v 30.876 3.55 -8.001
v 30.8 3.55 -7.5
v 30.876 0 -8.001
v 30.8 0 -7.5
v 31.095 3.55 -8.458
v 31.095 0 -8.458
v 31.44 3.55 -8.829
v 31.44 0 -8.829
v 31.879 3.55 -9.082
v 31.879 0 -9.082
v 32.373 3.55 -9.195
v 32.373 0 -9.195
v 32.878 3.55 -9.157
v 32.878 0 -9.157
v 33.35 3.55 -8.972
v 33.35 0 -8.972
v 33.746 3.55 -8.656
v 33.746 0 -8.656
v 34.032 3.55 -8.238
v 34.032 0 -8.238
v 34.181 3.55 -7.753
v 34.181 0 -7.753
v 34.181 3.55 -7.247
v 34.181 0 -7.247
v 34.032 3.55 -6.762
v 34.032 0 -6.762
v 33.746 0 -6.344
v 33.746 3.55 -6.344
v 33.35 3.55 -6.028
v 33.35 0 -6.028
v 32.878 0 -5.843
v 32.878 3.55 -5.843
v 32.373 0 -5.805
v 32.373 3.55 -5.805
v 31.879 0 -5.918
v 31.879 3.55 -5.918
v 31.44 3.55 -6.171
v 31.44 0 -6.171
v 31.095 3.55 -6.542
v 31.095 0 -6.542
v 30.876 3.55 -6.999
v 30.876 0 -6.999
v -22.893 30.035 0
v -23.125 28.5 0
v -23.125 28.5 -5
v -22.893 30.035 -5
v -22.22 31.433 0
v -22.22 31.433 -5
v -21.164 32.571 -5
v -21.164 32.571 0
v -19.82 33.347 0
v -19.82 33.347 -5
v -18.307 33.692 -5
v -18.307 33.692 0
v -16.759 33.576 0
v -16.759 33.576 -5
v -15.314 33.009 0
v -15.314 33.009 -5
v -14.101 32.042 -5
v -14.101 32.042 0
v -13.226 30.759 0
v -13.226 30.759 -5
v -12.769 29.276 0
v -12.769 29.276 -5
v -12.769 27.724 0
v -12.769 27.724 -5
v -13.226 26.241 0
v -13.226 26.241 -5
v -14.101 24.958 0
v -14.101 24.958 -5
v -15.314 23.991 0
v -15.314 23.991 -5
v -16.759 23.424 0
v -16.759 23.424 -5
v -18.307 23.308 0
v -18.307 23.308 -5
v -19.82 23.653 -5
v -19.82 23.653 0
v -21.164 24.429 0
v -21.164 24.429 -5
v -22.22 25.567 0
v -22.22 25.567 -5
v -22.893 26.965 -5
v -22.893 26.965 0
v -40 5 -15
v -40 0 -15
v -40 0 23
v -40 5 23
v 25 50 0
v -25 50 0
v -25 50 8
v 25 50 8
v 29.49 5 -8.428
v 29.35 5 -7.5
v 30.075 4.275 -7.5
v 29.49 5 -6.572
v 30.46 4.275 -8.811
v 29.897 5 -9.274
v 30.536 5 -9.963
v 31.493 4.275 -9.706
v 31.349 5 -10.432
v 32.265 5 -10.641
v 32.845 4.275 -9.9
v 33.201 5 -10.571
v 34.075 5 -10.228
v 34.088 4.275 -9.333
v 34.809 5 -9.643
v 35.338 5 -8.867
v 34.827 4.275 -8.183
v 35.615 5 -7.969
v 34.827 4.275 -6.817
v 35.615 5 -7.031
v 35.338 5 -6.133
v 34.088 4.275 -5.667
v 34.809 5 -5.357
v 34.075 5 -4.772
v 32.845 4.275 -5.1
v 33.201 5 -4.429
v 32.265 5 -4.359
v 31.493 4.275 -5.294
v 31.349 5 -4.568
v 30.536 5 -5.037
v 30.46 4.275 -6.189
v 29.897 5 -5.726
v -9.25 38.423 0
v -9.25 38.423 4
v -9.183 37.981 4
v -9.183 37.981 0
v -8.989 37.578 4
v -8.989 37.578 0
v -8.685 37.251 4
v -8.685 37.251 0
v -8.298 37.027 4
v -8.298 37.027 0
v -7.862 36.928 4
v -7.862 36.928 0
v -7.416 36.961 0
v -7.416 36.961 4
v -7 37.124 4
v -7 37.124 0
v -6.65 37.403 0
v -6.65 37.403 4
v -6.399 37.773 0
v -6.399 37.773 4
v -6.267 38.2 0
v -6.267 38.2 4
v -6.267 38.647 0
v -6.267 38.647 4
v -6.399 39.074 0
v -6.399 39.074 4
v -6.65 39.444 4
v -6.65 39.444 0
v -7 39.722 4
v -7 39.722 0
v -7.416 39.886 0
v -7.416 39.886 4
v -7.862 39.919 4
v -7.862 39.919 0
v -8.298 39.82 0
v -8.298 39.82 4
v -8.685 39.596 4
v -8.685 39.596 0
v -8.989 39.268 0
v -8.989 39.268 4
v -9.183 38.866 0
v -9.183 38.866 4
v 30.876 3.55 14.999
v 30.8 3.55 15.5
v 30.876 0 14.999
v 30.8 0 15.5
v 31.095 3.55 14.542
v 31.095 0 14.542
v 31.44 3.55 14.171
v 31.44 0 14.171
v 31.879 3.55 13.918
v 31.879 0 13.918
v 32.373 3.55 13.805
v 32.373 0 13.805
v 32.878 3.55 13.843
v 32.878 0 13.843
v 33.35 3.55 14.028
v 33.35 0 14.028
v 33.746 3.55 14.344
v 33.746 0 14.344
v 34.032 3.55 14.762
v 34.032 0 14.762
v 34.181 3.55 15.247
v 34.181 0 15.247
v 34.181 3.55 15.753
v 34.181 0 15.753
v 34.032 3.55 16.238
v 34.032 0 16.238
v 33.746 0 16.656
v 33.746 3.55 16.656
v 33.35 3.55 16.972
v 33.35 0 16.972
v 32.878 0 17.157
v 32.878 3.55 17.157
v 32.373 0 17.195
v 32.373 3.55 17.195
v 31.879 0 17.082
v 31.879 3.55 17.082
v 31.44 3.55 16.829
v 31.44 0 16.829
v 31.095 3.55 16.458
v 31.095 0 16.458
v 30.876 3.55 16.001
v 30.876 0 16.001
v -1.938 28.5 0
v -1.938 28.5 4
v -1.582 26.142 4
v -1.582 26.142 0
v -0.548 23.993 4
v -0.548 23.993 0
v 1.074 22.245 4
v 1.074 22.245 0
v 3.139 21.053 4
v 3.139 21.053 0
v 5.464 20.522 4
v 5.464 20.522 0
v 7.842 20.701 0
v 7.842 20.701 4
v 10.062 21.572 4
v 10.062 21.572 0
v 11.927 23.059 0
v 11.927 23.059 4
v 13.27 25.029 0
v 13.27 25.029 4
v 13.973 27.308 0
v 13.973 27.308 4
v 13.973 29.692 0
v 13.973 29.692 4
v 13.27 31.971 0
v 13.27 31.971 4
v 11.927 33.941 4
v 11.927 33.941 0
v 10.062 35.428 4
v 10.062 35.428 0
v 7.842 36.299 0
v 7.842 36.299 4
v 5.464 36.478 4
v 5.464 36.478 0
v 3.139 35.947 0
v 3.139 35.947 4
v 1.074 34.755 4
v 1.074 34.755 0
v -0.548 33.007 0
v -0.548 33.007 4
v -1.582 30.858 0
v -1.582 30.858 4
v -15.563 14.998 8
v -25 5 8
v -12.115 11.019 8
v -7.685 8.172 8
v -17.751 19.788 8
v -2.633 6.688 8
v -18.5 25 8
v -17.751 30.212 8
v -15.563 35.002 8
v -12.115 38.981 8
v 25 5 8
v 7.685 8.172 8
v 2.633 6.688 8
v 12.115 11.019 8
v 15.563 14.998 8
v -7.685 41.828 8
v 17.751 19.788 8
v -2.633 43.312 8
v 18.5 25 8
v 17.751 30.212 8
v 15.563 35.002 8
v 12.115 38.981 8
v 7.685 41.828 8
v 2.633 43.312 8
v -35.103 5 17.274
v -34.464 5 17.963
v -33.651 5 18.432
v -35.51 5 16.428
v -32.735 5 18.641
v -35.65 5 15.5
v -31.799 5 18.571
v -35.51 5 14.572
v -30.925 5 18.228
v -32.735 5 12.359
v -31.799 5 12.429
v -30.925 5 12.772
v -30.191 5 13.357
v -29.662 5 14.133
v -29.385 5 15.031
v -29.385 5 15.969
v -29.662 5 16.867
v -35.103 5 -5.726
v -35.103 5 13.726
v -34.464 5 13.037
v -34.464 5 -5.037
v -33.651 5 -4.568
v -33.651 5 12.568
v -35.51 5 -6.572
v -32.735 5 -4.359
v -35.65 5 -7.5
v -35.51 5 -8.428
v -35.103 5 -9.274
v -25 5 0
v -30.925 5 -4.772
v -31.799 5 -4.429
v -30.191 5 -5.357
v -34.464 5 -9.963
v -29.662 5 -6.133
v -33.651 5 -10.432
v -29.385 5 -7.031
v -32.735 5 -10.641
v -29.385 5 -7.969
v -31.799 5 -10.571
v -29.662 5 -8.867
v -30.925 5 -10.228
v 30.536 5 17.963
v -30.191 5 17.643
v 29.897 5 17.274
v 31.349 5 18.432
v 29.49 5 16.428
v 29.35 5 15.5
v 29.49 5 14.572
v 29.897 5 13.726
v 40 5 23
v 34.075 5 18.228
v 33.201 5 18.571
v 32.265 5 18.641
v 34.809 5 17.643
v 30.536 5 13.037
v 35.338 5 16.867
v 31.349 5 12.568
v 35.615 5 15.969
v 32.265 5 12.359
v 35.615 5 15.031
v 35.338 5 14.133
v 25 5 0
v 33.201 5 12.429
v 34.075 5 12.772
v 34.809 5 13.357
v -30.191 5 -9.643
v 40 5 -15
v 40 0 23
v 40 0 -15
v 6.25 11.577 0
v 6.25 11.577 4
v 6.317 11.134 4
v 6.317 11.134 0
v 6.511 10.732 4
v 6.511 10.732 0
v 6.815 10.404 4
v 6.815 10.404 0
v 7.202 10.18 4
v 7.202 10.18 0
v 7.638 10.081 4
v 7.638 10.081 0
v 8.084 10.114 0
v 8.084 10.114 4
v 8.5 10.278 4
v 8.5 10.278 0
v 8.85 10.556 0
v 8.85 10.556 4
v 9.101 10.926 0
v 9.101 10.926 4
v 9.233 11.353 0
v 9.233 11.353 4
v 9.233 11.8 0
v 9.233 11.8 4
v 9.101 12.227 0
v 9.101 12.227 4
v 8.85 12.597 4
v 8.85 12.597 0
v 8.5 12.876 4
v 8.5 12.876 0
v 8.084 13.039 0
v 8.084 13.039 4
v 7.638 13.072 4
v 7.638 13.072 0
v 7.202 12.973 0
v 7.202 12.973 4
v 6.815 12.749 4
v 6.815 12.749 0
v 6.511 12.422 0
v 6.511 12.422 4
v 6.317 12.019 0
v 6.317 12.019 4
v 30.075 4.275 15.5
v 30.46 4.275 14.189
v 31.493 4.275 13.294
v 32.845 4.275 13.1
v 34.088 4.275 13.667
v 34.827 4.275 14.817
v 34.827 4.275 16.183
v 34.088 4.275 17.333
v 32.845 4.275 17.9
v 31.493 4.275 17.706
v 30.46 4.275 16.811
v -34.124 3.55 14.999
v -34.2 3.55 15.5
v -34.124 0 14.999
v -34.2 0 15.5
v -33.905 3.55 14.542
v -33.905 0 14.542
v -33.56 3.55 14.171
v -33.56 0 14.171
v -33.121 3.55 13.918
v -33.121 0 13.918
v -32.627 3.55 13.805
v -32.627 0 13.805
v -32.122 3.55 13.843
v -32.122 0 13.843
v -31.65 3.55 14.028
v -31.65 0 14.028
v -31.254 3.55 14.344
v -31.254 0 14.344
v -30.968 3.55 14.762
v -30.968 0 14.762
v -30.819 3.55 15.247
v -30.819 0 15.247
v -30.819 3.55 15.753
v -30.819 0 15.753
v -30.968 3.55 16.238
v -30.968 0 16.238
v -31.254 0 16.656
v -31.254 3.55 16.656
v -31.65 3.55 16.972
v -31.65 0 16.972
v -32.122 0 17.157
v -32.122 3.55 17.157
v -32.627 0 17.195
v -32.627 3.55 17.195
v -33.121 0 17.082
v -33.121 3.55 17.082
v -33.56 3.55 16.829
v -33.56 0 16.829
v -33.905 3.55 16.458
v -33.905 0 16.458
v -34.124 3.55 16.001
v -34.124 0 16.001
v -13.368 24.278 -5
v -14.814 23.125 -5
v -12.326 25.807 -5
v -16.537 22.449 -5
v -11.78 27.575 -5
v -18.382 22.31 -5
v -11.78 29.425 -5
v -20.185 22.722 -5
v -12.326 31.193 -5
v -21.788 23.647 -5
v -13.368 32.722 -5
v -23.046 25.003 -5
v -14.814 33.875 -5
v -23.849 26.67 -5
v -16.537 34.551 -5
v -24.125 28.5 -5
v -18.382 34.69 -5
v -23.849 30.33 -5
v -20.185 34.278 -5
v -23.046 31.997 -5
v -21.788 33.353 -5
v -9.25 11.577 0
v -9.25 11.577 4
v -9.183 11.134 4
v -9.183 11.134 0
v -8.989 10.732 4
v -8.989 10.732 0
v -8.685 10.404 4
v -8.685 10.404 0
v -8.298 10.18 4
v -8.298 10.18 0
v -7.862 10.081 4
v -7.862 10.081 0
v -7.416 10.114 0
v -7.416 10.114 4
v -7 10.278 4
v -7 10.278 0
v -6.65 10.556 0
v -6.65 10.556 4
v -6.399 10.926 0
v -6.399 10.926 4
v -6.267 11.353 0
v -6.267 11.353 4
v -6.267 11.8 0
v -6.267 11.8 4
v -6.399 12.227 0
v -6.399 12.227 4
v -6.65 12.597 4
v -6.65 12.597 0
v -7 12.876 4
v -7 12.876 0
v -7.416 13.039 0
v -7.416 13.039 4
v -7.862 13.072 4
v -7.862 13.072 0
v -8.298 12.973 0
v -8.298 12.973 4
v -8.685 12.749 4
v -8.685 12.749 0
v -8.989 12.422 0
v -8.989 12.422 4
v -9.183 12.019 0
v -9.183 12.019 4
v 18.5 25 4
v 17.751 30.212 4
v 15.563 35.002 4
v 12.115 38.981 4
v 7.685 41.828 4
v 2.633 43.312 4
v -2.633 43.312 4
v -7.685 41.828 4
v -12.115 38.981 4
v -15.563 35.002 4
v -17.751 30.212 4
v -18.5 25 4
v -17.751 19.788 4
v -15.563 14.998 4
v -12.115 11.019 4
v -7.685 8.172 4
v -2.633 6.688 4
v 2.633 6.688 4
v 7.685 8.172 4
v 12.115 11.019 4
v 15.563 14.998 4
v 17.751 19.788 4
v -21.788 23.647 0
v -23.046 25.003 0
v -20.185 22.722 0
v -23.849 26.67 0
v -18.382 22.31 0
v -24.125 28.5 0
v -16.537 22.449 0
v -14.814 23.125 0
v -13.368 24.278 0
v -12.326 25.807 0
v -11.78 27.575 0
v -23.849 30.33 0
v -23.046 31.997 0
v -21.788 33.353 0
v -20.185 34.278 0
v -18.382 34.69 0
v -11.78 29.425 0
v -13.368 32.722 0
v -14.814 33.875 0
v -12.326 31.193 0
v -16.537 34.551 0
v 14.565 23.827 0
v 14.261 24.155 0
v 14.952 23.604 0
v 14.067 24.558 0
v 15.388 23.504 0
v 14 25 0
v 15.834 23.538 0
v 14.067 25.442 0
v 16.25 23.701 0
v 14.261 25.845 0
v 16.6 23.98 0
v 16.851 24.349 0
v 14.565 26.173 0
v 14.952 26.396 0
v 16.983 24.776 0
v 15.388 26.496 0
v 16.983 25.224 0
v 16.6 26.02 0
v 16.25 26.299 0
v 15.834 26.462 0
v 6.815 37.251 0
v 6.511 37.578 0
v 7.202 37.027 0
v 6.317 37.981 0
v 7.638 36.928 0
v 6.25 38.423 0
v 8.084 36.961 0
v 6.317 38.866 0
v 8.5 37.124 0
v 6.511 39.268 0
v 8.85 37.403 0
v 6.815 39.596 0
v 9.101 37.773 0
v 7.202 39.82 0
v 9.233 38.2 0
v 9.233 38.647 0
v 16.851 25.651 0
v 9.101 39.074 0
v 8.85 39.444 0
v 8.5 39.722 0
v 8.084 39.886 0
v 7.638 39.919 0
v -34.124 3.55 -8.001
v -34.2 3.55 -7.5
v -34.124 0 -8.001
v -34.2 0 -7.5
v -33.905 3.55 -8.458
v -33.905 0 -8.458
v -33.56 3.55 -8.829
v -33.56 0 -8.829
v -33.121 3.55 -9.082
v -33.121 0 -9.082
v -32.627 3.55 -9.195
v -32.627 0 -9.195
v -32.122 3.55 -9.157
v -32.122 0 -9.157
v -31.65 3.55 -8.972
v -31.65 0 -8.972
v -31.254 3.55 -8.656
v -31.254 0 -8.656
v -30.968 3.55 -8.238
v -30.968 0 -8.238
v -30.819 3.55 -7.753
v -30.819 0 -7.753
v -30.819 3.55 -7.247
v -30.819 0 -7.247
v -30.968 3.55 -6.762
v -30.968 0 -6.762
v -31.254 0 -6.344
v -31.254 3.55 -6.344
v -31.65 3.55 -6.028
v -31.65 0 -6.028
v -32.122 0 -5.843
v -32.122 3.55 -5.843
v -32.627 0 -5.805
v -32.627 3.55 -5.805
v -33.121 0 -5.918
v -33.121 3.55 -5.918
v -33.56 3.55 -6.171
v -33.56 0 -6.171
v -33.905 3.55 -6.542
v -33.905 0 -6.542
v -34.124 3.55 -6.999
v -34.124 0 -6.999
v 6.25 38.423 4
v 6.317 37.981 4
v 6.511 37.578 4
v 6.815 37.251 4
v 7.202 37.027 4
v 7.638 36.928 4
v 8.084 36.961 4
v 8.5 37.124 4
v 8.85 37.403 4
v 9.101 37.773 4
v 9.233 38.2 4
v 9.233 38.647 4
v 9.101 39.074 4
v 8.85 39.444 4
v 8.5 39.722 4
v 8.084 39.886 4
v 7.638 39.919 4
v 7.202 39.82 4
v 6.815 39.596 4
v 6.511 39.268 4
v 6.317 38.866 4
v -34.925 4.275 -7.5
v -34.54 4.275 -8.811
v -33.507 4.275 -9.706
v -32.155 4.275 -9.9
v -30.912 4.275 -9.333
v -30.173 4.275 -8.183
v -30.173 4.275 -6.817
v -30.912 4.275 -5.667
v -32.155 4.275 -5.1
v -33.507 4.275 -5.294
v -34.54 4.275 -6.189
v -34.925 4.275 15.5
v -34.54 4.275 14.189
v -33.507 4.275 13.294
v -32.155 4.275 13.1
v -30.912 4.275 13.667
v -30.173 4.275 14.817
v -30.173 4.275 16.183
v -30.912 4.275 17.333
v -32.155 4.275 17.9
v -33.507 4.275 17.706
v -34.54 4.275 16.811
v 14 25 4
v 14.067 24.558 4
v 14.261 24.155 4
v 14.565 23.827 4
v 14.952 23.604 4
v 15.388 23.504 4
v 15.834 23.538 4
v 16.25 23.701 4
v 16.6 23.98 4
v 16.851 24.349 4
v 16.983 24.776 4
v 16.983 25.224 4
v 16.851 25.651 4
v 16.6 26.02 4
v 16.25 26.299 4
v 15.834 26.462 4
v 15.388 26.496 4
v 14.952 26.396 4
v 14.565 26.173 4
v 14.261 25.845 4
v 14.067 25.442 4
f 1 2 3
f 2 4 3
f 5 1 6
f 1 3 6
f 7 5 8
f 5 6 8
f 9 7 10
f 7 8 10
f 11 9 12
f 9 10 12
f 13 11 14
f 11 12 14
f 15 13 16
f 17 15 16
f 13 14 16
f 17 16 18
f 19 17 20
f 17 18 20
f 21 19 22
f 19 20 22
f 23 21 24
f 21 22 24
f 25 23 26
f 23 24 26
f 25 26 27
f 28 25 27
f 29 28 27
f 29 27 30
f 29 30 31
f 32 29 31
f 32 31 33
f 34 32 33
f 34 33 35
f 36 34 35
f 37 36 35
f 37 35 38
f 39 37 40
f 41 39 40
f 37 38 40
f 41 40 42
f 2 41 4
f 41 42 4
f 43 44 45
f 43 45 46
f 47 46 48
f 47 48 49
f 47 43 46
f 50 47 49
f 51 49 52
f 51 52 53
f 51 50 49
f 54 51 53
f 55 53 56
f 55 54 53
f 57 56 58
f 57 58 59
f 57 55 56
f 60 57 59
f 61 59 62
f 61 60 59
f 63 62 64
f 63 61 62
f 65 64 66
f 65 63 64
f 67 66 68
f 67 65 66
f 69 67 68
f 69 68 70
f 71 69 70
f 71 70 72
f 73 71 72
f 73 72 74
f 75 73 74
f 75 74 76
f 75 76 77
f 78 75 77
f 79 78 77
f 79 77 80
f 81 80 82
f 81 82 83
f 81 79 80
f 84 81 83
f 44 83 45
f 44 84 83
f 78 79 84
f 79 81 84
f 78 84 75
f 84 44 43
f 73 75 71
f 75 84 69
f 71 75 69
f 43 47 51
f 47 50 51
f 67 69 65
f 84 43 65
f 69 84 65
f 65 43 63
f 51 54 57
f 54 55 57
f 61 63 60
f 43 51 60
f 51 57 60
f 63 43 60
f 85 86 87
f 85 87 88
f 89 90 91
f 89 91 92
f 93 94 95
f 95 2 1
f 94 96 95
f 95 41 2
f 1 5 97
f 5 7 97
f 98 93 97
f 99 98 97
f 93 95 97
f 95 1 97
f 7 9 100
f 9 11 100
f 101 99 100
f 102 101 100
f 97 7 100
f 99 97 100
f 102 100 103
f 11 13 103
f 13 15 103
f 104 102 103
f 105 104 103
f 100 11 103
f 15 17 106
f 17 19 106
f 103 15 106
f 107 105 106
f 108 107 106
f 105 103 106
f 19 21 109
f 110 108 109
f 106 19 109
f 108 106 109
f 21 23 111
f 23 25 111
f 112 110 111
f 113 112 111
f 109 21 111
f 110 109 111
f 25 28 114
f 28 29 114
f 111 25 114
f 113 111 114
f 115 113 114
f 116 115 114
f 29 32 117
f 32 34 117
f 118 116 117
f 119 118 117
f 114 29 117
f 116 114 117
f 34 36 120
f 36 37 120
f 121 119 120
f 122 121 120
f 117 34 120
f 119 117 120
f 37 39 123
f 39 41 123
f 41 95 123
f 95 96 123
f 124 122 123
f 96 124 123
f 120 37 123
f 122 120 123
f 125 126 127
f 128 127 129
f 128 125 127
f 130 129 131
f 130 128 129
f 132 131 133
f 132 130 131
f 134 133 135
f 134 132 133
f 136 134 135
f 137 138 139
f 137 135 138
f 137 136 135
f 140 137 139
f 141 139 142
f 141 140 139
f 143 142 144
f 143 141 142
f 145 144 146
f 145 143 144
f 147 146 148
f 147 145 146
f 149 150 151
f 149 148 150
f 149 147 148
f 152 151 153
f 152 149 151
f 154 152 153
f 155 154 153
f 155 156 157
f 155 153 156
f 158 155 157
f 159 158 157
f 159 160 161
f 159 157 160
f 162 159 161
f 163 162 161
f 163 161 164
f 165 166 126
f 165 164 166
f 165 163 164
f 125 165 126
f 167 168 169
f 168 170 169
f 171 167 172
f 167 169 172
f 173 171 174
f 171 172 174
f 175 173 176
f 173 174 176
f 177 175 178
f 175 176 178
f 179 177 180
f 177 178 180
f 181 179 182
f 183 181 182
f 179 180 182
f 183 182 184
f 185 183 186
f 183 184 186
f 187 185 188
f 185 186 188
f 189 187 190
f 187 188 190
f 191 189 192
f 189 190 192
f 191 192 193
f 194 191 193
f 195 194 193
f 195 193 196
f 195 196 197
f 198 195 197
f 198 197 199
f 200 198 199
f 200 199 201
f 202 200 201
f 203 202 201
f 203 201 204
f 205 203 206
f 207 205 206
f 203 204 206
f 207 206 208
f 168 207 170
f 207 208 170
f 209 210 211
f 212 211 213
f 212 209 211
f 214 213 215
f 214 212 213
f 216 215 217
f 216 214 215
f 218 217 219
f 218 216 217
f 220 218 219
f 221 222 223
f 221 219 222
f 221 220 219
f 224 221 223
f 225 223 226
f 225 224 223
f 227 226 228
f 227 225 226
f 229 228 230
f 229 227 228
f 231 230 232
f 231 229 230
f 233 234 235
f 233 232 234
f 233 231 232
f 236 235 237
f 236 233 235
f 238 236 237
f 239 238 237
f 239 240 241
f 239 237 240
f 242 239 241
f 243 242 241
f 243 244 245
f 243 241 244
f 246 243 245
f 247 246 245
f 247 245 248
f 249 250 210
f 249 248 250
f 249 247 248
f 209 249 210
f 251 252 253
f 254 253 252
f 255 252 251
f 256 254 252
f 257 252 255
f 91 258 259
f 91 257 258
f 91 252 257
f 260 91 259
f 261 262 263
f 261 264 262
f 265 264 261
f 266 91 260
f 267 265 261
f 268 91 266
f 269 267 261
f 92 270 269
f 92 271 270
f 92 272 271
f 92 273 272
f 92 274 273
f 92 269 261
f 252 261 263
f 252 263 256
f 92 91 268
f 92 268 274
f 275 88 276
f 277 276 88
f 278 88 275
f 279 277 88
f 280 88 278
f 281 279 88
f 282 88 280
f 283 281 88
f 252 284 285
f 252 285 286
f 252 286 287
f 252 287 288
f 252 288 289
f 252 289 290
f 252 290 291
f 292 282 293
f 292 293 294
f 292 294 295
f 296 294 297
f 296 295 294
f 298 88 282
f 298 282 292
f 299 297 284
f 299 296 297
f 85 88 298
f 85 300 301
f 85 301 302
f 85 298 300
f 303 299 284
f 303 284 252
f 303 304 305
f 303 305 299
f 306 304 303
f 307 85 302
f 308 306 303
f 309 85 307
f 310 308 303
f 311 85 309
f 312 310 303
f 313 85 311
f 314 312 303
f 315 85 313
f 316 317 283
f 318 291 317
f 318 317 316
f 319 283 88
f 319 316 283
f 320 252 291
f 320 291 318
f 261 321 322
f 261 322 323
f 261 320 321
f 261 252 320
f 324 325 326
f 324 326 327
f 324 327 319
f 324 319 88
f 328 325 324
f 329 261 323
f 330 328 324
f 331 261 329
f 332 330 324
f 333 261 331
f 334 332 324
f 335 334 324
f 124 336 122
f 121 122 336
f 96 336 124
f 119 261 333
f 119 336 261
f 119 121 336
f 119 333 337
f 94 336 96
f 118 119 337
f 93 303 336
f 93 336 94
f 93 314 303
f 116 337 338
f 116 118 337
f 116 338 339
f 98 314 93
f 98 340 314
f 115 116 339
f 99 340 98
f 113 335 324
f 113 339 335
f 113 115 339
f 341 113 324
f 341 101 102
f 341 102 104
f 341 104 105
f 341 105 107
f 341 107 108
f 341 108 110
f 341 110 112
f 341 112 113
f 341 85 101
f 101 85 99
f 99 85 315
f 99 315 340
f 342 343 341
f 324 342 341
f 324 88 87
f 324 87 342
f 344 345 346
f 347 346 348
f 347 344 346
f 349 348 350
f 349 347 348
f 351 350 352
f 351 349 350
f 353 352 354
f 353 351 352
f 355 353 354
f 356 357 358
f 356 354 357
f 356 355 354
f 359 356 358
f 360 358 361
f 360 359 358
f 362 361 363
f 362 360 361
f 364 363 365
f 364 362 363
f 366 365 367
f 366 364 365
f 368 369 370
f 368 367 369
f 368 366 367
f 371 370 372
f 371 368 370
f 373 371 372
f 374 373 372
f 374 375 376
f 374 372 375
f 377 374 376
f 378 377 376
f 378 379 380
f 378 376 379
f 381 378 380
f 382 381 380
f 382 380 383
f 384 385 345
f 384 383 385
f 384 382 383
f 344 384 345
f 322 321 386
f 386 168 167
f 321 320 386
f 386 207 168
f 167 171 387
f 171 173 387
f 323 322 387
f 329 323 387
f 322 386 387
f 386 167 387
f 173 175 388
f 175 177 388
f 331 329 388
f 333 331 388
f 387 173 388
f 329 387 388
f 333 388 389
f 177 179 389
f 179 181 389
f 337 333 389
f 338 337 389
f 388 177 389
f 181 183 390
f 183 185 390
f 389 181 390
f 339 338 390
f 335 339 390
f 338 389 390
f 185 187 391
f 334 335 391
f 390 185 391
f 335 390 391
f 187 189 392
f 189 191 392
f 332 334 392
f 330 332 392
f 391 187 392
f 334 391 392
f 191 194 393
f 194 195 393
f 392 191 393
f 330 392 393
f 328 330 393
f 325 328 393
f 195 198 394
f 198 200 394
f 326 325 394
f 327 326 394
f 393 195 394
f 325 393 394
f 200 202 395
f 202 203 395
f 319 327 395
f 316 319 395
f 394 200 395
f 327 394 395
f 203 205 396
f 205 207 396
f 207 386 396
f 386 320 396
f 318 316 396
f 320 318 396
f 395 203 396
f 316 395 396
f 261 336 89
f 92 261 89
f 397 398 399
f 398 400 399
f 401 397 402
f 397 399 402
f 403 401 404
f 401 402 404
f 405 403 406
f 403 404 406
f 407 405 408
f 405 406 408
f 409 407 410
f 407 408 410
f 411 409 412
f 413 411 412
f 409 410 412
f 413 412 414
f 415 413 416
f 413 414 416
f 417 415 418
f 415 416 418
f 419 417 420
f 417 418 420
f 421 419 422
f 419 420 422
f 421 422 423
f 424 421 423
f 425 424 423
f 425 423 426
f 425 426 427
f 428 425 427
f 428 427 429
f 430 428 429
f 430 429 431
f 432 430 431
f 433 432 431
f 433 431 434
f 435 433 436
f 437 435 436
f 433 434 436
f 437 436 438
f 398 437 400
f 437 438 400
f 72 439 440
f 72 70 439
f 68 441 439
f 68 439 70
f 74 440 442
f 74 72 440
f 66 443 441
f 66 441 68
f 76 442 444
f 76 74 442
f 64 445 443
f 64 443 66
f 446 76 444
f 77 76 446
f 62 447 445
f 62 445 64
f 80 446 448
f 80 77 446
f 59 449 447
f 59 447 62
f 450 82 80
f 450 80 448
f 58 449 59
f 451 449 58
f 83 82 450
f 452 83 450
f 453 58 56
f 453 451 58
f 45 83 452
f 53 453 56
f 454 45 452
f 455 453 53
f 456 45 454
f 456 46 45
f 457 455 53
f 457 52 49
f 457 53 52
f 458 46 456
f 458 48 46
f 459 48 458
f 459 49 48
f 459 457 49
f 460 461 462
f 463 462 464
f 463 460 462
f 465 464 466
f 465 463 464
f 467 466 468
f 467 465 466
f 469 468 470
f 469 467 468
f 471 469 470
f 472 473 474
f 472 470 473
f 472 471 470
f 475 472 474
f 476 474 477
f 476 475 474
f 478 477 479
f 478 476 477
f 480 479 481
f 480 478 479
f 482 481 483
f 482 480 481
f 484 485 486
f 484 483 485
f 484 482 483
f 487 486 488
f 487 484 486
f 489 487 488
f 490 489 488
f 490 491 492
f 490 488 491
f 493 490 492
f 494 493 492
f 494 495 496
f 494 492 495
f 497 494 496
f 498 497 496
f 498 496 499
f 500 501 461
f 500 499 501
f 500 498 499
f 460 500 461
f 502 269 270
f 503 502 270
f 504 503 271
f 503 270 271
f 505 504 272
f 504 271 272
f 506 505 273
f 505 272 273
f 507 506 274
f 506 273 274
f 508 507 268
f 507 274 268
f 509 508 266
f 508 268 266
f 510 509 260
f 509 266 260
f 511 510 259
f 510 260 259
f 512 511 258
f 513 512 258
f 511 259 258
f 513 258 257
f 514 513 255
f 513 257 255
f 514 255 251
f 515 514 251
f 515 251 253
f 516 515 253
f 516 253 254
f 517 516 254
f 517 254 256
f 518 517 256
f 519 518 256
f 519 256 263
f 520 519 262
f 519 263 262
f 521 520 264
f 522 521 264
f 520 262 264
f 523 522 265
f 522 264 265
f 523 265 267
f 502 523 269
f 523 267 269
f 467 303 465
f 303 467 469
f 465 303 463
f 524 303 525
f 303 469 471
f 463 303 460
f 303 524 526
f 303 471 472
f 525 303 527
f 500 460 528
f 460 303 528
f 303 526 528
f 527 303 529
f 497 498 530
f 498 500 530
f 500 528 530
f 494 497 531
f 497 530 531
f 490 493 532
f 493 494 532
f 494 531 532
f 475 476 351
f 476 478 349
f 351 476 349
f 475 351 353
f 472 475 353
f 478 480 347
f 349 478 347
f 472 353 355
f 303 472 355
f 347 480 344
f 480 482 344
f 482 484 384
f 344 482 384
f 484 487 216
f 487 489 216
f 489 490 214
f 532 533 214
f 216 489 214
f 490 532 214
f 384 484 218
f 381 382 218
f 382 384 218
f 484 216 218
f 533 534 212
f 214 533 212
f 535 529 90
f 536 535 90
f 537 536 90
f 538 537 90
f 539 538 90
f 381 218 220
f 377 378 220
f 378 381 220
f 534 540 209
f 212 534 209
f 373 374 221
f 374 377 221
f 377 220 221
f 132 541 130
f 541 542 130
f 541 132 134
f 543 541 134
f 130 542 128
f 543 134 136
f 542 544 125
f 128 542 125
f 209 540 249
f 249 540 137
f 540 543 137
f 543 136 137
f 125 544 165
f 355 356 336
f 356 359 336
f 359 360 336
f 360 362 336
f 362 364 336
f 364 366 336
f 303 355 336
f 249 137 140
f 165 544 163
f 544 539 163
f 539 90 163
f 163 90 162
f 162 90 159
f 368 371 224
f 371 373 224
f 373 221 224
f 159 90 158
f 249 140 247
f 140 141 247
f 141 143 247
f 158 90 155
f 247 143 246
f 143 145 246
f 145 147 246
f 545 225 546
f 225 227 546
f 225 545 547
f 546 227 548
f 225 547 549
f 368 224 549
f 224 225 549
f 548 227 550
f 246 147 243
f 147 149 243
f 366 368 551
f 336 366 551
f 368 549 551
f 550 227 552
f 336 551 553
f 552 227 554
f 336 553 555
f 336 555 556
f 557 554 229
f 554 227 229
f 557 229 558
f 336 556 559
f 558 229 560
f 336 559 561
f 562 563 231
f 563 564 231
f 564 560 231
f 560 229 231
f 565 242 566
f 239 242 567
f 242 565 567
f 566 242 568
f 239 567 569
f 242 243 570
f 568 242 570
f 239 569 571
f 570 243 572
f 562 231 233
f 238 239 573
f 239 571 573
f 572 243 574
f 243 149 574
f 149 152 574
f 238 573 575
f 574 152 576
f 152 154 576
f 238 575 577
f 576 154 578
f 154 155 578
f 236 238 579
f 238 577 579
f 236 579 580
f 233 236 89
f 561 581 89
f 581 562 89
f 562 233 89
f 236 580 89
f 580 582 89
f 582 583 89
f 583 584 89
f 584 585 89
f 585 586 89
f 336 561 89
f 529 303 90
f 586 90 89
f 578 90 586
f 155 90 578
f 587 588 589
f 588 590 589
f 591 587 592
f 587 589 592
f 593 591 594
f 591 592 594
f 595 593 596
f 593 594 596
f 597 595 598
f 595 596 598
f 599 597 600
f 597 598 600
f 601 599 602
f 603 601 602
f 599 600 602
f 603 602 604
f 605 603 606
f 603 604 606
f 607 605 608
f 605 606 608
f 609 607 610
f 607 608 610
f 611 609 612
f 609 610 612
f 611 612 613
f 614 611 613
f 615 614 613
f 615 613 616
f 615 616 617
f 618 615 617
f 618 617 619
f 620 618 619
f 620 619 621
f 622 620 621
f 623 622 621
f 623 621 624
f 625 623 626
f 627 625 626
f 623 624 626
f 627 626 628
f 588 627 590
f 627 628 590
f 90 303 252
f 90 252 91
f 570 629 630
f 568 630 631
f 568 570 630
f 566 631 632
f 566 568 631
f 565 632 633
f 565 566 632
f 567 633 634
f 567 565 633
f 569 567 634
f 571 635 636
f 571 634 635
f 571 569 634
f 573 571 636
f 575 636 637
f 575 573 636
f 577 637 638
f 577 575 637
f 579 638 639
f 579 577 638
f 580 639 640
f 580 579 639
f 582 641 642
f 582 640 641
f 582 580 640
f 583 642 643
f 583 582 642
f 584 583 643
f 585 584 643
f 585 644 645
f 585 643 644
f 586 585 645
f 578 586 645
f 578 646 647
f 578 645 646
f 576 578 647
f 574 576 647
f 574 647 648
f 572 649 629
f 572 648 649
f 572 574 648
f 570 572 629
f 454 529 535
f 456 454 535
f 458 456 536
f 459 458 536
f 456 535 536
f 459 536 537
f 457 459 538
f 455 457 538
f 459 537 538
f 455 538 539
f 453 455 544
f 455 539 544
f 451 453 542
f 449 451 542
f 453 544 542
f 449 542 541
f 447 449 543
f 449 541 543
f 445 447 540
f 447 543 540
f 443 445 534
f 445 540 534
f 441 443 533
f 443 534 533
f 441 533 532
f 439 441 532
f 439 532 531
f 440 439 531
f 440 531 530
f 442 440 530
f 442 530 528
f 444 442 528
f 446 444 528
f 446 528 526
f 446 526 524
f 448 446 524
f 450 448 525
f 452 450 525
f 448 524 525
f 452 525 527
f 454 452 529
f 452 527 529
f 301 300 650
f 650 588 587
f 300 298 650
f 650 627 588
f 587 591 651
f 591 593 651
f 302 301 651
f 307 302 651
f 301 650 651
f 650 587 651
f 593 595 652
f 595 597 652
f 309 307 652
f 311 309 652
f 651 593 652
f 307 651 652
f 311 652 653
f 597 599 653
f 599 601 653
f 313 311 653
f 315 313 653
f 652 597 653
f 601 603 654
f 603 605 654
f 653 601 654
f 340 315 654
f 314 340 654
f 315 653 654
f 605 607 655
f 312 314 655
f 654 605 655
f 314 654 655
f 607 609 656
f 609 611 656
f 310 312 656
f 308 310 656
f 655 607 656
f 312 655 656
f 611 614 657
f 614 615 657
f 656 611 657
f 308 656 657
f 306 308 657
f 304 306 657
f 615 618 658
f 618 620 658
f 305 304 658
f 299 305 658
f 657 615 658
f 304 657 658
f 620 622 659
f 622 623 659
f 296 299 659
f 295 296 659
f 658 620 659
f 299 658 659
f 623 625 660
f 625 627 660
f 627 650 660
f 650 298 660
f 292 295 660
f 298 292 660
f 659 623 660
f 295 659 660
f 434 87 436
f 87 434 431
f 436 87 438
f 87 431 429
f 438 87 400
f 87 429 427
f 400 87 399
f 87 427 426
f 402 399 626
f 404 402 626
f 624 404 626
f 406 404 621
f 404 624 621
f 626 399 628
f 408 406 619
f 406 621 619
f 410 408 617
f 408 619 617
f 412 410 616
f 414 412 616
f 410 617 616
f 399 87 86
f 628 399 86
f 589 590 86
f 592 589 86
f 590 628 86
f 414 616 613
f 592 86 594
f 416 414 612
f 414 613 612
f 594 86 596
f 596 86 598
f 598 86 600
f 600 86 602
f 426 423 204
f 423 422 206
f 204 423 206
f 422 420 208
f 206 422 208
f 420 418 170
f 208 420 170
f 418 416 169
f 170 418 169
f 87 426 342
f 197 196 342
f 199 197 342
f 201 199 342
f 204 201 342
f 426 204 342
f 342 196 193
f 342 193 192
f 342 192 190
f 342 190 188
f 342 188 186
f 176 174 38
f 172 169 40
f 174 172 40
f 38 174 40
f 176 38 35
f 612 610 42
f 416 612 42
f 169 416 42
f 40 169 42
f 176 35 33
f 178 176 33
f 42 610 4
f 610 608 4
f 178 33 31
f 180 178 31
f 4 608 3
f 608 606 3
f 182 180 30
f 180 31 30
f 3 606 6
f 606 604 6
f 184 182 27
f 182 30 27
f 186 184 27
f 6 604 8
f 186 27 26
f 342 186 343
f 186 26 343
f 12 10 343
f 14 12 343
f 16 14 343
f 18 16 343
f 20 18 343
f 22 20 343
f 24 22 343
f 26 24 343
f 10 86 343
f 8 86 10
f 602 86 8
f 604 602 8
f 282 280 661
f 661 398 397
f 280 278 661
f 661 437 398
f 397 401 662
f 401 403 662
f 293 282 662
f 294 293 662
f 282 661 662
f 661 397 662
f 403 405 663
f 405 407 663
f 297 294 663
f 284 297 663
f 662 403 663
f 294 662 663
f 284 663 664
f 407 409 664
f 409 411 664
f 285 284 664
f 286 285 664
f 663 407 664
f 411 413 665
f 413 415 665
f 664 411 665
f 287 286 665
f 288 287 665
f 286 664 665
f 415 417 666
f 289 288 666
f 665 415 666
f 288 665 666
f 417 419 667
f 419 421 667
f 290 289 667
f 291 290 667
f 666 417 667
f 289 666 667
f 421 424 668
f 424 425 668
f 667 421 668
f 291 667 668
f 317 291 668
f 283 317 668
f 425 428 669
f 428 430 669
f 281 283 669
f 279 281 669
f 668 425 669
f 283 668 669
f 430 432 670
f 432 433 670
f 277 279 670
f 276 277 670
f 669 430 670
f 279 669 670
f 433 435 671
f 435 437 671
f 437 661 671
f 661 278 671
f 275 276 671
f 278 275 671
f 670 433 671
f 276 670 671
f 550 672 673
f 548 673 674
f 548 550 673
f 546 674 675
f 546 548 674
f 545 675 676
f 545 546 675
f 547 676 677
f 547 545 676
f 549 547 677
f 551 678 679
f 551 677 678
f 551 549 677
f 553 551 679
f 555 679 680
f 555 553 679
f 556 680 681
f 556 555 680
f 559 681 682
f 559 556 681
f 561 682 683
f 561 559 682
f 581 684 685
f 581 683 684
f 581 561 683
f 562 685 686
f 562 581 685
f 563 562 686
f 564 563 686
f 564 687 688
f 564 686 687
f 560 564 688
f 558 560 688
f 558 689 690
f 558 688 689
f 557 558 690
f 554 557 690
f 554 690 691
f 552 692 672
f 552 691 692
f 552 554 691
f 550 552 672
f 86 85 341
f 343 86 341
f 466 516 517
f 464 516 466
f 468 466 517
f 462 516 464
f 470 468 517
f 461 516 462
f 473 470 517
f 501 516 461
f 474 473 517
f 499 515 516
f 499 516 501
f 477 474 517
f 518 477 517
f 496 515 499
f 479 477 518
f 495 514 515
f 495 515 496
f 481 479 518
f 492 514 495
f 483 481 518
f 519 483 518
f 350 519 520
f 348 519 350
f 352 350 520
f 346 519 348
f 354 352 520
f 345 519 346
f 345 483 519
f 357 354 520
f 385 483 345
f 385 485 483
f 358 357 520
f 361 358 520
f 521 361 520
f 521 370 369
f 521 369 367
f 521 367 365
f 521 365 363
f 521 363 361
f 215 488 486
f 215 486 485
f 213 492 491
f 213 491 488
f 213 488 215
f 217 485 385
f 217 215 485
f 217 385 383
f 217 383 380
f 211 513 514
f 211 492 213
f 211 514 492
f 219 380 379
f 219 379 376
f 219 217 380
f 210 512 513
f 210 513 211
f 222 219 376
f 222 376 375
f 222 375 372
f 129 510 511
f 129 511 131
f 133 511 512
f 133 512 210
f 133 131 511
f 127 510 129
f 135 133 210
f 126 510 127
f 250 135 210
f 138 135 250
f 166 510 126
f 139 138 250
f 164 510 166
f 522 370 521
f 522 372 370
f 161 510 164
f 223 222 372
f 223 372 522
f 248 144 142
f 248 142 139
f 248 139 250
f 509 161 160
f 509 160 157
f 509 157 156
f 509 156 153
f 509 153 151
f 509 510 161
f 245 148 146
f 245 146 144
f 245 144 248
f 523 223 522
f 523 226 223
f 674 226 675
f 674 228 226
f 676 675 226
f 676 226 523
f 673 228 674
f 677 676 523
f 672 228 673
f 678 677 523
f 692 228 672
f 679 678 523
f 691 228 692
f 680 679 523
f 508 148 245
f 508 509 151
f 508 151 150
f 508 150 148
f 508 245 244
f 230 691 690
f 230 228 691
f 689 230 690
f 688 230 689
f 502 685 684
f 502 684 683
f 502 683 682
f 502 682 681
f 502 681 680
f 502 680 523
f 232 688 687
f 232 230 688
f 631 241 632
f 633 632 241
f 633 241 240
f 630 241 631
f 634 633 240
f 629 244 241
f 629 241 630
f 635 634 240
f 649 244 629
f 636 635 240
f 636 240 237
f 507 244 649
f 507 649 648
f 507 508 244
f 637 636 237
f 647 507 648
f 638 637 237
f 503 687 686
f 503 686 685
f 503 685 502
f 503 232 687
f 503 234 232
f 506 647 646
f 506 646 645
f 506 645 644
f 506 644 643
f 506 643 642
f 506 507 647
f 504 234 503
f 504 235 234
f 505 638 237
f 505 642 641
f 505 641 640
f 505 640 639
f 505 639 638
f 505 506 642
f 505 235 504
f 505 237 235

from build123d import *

# Parameters (mm, degrees)
SKETCH3_W                                       = 50
SKETCH3_H                                       = 50
BOSS_EXTRUDE1_DEPTH                             = 8
SKETCH3_3_R                                     = 1.5
SKETCH3_3_R_2                                   = 8
CUT_EXTRUDE2_DEPTH                              = 10
SKETCH4_R                                       = 18.5
CUT_EXTRUDE3_DEPTH                              = 4
BOSS_EXTRUDE2_DEPTH                             = 15
BOSS_EXTRUDE2_DEPTH_BACK                        = 23
SKETCH6_W                                       = 80
SKETCH6_H                                       = 5
CSK_FOR_M3_FLAT_HEAD_MACHINE_SCREW1_D           = 3.4
CSK_FOR_M3_FLAT_HEAD_MACHINE_SCREW1_CSINK_D     = 6.3
CSK_FOR_M3_FLAT_HEAD_MACHINE_SCREW1_CSINK_ANGLE = 90
SKETCH11_R                                      = 6.207
SKETCH11_R_2                                    = 5.207
BOSS_EXTRUDE3_DEPTH                             = 5


with BuildPart() as part:
    # Sketch3 → Boss-Extrude1 (new body)
    with BuildSketch(Plane.XY):
        with Locations((0, 25)):
            Rectangle(SKETCH3_W, SKETCH3_H)
    extrude(amount=BOSS_EXTRUDE1_DEPTH)

    # Sketch3<3> → Cut-Extrude2 (cut)
    with BuildSketch(Plane.XY):
        with Locations((-7.75, 38.423393759)):
            Circle(SKETCH3_3_R)
        with Locations((7.75, 38.423393759)):
            Circle(SKETCH3_3_R)
        with Locations((-7.75, 11.576606241)):
            Circle(SKETCH3_3_R)
        with Locations((7.75, 11.576606241)):
            Circle(SKETCH3_3_R)
        with Locations((15.5, 25)):
            Circle(SKETCH3_3_R)
        with Locations((6.062177825, 28.499999999)):
            Circle(SKETCH3_3_R_2)
    extrude(amount=CUT_EXTRUDE2_DEPTH, mode=Mode.SUBTRACT)

    # Sketch4 → Cut-Extrude3 (cut)
    with BuildSketch(Plane.XY.offset(8)):
        with Locations((0, 25)):
            Circle(SKETCH4_R)
    extrude(amount=-CUT_EXTRUDE3_DEPTH, mode=Mode.SUBTRACT)

    # Sketch6 → Boss-Extrude2 (add, two sides: drawn at the far end of the back side and taken through both)
    with BuildSketch(Plane.XY.offset(8).offset(-BOSS_EXTRUDE2_DEPTH_BACK)):
        with Locations((0, 2.5)):
            Rectangle(SKETCH6_W, SKETCH6_H)
    extrude(amount=BOSS_EXTRUDE2_DEPTH + BOSS_EXTRUDE2_DEPTH_BACK)

    # CSK for M3 Flat Head Machine Screw1 (through all)
    with Locations(Plane(origin=(0, 5, 0), x_dir=(1, 0, 0), z_dir=(0, 1, 0))):
        with Locations((-32.5, 7.5), (-32.5, -15.5), (32.5, -15.5), (32.5, 7.5)):
            CounterSinkHole(CSK_FOR_M3_FLAT_HEAD_MACHINE_SCREW1_D / 2, CSK_FOR_M3_FLAT_HEAD_MACHINE_SCREW1_CSINK_D / 2, counter_sink_angle=CSK_FOR_M3_FLAT_HEAD_MACHINE_SCREW1_CSINK_ANGLE)

    # Sketch11 → Boss-Extrude3 (add)
    with BuildSketch(Plane(origin=(0, 0, 0), x_dir=(-1, 0, 0), z_dir=(0, 0, -1))):
        with Locations((17.917822175, 28.499999999)):
            Circle(SKETCH11_R)
        with Locations((17.917822175, 28.499999999)):
            Circle(SKETCH11_R_2, mode=Mode.SUBTRACT)
    extrude(amount=BOSS_EXTRUDE3_DEPTH)


solid = part.part
